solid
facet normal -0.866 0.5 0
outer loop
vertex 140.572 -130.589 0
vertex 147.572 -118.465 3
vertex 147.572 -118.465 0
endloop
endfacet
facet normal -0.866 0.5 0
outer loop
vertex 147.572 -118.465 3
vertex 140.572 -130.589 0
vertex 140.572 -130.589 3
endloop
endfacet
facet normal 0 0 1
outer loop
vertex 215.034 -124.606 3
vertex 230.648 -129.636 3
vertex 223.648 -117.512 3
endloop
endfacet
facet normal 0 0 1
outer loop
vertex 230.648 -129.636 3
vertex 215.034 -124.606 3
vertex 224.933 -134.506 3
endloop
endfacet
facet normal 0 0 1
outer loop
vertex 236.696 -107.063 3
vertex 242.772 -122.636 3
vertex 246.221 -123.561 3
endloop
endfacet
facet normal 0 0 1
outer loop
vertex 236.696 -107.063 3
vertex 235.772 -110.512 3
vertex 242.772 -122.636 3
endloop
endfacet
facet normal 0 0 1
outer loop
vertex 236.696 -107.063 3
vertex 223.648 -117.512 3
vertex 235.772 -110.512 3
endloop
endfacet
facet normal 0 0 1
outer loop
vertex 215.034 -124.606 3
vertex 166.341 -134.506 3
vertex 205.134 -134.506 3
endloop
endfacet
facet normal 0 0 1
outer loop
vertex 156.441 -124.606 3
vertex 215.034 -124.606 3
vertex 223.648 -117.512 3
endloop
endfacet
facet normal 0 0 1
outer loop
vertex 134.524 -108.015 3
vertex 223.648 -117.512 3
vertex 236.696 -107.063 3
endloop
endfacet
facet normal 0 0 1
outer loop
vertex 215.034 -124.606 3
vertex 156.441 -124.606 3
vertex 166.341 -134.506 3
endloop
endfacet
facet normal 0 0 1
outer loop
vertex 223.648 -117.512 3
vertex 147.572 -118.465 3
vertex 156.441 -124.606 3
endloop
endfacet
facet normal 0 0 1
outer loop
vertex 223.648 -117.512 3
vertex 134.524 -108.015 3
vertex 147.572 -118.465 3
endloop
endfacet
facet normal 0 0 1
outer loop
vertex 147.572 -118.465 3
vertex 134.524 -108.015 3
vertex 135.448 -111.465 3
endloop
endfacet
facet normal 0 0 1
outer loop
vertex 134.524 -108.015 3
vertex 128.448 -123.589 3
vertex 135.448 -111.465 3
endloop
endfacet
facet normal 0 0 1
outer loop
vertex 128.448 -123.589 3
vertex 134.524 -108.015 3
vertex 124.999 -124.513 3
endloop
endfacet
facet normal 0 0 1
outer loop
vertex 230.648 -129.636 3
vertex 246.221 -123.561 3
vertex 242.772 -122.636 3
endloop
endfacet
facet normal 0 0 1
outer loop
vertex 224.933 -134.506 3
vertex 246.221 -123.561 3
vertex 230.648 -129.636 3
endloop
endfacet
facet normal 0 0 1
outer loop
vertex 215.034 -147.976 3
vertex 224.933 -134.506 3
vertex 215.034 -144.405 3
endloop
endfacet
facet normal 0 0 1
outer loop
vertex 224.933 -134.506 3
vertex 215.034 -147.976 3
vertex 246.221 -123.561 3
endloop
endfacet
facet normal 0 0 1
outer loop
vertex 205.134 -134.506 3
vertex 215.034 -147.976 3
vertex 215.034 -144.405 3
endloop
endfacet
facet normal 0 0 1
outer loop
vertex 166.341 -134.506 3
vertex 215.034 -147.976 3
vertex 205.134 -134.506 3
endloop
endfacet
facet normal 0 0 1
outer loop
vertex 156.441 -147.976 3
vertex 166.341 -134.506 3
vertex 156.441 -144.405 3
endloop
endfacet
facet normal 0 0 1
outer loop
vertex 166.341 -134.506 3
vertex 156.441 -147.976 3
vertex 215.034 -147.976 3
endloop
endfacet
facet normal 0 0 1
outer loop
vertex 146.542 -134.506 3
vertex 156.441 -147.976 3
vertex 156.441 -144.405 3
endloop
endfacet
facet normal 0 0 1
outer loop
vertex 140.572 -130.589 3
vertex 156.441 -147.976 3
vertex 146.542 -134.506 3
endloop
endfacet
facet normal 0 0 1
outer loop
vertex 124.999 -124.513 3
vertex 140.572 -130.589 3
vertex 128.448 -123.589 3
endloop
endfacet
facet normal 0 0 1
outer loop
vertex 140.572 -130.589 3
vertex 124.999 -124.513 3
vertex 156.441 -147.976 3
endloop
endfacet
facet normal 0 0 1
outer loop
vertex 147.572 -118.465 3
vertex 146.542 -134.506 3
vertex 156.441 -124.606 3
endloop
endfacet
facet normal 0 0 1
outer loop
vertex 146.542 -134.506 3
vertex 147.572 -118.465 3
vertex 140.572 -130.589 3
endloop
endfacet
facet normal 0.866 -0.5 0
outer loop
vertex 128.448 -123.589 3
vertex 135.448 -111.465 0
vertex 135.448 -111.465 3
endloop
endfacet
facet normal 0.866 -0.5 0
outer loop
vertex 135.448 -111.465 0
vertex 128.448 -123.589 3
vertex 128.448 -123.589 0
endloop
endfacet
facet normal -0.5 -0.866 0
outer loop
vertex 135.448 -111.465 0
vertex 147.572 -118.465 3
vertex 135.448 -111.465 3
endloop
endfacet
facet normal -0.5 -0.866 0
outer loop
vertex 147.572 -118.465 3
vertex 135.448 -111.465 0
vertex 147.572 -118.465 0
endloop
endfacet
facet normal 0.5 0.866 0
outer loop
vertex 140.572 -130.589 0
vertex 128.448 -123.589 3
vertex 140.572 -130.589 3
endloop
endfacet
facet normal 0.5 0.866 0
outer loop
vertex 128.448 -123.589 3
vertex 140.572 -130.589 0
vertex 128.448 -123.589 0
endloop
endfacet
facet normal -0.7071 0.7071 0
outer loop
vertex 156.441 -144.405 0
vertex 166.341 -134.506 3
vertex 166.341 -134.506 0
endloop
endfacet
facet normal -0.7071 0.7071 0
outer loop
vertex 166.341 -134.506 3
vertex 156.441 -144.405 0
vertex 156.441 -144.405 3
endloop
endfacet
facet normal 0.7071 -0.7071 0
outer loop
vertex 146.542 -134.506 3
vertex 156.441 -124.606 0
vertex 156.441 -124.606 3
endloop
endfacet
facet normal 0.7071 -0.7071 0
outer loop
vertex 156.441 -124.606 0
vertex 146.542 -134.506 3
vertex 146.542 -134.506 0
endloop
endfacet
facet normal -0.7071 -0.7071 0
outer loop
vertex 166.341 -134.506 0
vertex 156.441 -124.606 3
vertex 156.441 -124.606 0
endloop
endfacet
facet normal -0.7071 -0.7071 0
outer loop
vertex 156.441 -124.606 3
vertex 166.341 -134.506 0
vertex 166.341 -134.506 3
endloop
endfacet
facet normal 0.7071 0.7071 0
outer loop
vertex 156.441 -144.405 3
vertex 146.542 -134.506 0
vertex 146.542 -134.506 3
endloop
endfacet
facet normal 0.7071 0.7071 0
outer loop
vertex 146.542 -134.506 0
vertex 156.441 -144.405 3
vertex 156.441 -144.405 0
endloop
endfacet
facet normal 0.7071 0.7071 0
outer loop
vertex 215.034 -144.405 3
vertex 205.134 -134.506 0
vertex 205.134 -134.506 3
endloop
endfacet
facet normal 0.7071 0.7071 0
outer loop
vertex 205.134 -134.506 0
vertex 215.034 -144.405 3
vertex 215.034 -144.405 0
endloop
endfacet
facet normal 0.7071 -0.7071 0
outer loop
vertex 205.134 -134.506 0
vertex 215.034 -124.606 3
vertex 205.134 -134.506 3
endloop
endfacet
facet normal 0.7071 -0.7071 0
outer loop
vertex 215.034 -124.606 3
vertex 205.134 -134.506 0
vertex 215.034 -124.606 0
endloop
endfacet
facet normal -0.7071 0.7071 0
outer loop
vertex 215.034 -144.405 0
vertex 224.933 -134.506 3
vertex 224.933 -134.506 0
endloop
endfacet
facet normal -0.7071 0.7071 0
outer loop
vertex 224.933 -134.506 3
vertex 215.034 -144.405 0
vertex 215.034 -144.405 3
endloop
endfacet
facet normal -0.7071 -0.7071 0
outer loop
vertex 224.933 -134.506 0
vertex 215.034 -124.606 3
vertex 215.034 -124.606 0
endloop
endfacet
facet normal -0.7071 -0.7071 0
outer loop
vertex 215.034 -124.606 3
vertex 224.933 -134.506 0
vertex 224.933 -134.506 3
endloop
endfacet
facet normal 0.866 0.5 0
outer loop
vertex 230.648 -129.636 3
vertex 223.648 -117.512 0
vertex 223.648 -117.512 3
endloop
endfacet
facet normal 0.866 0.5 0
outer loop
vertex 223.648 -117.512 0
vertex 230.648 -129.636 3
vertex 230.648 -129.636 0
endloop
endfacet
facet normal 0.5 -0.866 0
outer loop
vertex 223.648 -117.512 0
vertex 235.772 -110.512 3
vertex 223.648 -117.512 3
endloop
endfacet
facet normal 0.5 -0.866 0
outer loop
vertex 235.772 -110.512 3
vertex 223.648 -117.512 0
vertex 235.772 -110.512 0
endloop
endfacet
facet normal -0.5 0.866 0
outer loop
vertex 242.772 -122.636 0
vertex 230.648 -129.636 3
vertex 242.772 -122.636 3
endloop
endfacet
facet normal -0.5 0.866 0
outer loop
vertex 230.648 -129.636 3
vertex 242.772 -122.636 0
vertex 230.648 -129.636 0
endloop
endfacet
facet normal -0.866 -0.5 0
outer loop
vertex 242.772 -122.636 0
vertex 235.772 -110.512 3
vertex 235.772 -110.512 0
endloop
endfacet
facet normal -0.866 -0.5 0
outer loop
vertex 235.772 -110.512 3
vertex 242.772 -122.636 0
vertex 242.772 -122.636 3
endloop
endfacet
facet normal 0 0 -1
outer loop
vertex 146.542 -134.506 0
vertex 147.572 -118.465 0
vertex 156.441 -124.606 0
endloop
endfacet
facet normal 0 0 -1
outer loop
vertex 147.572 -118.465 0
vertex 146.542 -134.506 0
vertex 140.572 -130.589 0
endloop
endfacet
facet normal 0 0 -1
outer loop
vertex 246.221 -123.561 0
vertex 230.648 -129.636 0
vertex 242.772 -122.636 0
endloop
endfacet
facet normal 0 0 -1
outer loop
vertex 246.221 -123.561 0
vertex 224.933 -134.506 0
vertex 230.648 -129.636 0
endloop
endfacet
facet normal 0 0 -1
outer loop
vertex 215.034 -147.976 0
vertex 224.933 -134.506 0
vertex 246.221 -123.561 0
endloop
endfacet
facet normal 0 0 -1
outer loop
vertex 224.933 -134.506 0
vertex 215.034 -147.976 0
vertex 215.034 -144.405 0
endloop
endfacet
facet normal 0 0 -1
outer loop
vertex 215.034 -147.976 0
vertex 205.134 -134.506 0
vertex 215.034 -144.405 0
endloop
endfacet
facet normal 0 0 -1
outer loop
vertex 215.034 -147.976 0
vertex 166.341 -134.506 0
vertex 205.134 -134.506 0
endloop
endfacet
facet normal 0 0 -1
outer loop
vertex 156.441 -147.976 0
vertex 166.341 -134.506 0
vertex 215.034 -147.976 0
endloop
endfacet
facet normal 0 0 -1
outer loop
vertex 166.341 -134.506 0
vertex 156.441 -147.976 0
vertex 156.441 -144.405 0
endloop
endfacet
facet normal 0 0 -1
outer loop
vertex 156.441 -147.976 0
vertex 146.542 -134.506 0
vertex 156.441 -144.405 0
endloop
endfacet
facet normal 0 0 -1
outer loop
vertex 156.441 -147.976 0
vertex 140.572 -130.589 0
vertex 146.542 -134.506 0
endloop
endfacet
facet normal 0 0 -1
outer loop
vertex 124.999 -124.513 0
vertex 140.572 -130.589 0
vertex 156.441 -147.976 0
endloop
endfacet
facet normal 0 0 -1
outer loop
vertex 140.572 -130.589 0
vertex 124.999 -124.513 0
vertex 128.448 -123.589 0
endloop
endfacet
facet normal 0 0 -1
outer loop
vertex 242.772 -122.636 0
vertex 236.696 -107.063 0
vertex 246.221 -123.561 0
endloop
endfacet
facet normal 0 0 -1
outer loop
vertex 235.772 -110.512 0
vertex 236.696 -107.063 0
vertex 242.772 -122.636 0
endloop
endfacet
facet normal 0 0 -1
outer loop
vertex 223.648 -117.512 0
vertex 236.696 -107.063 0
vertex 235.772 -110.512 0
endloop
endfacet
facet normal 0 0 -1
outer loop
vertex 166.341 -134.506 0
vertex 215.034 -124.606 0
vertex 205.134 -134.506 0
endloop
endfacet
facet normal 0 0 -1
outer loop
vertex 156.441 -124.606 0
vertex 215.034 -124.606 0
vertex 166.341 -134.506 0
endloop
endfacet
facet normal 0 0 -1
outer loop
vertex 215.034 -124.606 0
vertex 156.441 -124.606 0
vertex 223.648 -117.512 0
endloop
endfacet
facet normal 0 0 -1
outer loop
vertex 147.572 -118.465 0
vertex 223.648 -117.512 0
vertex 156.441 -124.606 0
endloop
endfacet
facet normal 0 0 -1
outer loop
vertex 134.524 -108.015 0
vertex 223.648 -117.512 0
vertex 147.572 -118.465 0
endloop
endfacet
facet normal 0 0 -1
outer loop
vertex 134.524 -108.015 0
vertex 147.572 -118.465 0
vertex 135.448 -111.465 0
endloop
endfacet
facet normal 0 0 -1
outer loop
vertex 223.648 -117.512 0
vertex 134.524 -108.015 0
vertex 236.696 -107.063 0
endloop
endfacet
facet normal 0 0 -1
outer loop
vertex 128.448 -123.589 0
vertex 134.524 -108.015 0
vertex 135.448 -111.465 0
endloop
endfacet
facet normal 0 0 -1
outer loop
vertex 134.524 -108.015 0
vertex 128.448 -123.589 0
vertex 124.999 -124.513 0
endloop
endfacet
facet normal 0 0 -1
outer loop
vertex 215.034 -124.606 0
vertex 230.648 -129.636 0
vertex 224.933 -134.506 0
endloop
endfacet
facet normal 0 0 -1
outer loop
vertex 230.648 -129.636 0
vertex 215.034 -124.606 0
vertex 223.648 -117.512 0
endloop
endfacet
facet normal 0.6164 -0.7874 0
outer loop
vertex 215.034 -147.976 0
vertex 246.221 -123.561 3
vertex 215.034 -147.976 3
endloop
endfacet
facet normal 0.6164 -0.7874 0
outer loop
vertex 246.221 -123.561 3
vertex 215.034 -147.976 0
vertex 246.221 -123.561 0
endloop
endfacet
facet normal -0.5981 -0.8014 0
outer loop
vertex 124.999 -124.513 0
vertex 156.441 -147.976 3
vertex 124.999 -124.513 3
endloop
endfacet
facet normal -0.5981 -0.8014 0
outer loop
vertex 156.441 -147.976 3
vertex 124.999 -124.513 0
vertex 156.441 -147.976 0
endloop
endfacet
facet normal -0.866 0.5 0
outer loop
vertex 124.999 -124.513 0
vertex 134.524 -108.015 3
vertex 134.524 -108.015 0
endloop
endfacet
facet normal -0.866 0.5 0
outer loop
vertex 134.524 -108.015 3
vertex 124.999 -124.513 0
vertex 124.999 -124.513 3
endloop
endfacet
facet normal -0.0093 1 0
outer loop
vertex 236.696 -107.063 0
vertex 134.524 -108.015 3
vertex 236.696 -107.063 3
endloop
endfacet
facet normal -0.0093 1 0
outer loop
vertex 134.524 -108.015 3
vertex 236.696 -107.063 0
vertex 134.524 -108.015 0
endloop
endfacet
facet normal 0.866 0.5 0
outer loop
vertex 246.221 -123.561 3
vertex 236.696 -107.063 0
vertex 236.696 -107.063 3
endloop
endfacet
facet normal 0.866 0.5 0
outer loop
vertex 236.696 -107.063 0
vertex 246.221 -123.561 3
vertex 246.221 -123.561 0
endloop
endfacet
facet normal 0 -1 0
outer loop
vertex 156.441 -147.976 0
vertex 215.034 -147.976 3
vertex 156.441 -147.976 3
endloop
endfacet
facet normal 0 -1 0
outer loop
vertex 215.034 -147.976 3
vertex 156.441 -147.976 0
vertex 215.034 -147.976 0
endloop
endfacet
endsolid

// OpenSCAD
$fn = $preview ? 0 : 100;


difference(){
	difference() {
		union() {
			linear_extrude(height = 3) {
				polygon(points = [[215.0338847455189, -147.97596045400934], [156.44111525448116, -147.9759604540093], [124.99852839420937, -124.5131163507795], [134.5235283942094, -108.01533240868596], [236.69625, -107.06283240868598], [246.22125, -123.56061635077954], [215.0338847455189, -147.97596045400934]]);
			}
		}
	}
	/* Holes Below*/
	union(){
		translate(v = [138.0099203653, -121.0267243797, 0]) {
			rotate(a = -30) {
				cube(center = true, size = [14, 14, 6]);
			}
		}
		translate(v = [156.4411152545, -134.5055762724, 0]) {
			rotate(a = -45) {
				cube(center = true, size = [14, 14, 6]);
			}
		}
		translate(v = [215.0338847455, -134.5055762724, 0]) {
			rotate(a = 45) {
				cube(center = true, size = [14, 14, 6]);
			}
		}
		translate(v = [233.2098580290, -120.0742243797, 0]) {
			rotate(a = 30) {
				cube(center = true, size = [14, 14, 6]);
			}
		}
	} /* End Holes */ 
}
